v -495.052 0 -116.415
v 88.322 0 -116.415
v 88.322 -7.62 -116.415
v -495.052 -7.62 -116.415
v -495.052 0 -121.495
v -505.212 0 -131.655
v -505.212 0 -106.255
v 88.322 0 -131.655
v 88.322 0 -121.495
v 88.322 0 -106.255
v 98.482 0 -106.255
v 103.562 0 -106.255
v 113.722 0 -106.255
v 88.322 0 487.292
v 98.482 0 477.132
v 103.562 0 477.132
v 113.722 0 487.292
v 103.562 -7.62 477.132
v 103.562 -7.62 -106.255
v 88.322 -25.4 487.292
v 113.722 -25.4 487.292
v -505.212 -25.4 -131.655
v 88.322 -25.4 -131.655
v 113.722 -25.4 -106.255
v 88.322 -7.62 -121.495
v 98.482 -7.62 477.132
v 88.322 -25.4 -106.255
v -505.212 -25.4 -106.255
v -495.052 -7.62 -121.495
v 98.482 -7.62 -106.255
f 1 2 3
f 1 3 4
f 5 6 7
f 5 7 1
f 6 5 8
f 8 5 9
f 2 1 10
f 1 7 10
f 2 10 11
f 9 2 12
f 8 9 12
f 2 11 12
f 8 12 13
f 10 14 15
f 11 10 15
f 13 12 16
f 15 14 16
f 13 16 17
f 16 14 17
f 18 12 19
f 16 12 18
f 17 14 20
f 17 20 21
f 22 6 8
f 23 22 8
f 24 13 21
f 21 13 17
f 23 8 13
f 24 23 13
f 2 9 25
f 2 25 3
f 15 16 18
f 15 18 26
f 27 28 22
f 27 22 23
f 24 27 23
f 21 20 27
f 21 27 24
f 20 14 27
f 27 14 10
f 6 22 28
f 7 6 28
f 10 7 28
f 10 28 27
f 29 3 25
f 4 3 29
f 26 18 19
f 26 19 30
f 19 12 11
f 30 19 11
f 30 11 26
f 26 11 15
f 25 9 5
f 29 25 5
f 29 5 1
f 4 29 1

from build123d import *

# Parameters (mm, degrees)
F0_W     = 25.4
F0_H     = 593.5472
F0_W_2   = 593.5345
F0_H_2   = 25.4
F1_DEPTH = 25.4
F2_W     = 5.08
F2_H     = 583.3872
F3_DEPTH = 7.62
F4_W     = 583.3745
F4_H     = 5.08
F5_DEPTH = 7.62


with BuildPart() as f1:
    # F0 (on Front) → F1 (new body)
    with BuildSketch(Plane.XZ):
        with Locations((101.022233, 190.518868)):
            Rectangle(F0_W, F0_H)
        Polygon((88.322233, -106.254732), (88.322233, -131.654732), (113.722233, -106.254732), align=None)
        with Locations((-208.445017, -118.954732)):
            Rectangle(F0_W_2, F0_H_2)
    extrude(amount=F1_DEPTH)

    # F2 (on face) → F3 (cut)
    with BuildSketch(Plane(origin=(0, 0, 0), x_dir=(-1, 0, 0), z_dir=(0, 1, 0))):
        with Locations((-101.022233, 185.438868)):
            Rectangle(F2_W, F2_H)
    extrude(amount=-F3_DEPTH, mode=Mode.SUBTRACT)

    # F4 (on face) → F5 (cut)
    with BuildSketch(Plane(origin=(0, 0, 0), x_dir=(-1, 0, 0), z_dir=(0, 1, 0))):
        with Locations((203.365017, -118.954732)):
            Rectangle(F4_W, F4_H)
    extrude(amount=-F5_DEPTH, mode=Mode.SUBTRACT)


solid = f1.part
